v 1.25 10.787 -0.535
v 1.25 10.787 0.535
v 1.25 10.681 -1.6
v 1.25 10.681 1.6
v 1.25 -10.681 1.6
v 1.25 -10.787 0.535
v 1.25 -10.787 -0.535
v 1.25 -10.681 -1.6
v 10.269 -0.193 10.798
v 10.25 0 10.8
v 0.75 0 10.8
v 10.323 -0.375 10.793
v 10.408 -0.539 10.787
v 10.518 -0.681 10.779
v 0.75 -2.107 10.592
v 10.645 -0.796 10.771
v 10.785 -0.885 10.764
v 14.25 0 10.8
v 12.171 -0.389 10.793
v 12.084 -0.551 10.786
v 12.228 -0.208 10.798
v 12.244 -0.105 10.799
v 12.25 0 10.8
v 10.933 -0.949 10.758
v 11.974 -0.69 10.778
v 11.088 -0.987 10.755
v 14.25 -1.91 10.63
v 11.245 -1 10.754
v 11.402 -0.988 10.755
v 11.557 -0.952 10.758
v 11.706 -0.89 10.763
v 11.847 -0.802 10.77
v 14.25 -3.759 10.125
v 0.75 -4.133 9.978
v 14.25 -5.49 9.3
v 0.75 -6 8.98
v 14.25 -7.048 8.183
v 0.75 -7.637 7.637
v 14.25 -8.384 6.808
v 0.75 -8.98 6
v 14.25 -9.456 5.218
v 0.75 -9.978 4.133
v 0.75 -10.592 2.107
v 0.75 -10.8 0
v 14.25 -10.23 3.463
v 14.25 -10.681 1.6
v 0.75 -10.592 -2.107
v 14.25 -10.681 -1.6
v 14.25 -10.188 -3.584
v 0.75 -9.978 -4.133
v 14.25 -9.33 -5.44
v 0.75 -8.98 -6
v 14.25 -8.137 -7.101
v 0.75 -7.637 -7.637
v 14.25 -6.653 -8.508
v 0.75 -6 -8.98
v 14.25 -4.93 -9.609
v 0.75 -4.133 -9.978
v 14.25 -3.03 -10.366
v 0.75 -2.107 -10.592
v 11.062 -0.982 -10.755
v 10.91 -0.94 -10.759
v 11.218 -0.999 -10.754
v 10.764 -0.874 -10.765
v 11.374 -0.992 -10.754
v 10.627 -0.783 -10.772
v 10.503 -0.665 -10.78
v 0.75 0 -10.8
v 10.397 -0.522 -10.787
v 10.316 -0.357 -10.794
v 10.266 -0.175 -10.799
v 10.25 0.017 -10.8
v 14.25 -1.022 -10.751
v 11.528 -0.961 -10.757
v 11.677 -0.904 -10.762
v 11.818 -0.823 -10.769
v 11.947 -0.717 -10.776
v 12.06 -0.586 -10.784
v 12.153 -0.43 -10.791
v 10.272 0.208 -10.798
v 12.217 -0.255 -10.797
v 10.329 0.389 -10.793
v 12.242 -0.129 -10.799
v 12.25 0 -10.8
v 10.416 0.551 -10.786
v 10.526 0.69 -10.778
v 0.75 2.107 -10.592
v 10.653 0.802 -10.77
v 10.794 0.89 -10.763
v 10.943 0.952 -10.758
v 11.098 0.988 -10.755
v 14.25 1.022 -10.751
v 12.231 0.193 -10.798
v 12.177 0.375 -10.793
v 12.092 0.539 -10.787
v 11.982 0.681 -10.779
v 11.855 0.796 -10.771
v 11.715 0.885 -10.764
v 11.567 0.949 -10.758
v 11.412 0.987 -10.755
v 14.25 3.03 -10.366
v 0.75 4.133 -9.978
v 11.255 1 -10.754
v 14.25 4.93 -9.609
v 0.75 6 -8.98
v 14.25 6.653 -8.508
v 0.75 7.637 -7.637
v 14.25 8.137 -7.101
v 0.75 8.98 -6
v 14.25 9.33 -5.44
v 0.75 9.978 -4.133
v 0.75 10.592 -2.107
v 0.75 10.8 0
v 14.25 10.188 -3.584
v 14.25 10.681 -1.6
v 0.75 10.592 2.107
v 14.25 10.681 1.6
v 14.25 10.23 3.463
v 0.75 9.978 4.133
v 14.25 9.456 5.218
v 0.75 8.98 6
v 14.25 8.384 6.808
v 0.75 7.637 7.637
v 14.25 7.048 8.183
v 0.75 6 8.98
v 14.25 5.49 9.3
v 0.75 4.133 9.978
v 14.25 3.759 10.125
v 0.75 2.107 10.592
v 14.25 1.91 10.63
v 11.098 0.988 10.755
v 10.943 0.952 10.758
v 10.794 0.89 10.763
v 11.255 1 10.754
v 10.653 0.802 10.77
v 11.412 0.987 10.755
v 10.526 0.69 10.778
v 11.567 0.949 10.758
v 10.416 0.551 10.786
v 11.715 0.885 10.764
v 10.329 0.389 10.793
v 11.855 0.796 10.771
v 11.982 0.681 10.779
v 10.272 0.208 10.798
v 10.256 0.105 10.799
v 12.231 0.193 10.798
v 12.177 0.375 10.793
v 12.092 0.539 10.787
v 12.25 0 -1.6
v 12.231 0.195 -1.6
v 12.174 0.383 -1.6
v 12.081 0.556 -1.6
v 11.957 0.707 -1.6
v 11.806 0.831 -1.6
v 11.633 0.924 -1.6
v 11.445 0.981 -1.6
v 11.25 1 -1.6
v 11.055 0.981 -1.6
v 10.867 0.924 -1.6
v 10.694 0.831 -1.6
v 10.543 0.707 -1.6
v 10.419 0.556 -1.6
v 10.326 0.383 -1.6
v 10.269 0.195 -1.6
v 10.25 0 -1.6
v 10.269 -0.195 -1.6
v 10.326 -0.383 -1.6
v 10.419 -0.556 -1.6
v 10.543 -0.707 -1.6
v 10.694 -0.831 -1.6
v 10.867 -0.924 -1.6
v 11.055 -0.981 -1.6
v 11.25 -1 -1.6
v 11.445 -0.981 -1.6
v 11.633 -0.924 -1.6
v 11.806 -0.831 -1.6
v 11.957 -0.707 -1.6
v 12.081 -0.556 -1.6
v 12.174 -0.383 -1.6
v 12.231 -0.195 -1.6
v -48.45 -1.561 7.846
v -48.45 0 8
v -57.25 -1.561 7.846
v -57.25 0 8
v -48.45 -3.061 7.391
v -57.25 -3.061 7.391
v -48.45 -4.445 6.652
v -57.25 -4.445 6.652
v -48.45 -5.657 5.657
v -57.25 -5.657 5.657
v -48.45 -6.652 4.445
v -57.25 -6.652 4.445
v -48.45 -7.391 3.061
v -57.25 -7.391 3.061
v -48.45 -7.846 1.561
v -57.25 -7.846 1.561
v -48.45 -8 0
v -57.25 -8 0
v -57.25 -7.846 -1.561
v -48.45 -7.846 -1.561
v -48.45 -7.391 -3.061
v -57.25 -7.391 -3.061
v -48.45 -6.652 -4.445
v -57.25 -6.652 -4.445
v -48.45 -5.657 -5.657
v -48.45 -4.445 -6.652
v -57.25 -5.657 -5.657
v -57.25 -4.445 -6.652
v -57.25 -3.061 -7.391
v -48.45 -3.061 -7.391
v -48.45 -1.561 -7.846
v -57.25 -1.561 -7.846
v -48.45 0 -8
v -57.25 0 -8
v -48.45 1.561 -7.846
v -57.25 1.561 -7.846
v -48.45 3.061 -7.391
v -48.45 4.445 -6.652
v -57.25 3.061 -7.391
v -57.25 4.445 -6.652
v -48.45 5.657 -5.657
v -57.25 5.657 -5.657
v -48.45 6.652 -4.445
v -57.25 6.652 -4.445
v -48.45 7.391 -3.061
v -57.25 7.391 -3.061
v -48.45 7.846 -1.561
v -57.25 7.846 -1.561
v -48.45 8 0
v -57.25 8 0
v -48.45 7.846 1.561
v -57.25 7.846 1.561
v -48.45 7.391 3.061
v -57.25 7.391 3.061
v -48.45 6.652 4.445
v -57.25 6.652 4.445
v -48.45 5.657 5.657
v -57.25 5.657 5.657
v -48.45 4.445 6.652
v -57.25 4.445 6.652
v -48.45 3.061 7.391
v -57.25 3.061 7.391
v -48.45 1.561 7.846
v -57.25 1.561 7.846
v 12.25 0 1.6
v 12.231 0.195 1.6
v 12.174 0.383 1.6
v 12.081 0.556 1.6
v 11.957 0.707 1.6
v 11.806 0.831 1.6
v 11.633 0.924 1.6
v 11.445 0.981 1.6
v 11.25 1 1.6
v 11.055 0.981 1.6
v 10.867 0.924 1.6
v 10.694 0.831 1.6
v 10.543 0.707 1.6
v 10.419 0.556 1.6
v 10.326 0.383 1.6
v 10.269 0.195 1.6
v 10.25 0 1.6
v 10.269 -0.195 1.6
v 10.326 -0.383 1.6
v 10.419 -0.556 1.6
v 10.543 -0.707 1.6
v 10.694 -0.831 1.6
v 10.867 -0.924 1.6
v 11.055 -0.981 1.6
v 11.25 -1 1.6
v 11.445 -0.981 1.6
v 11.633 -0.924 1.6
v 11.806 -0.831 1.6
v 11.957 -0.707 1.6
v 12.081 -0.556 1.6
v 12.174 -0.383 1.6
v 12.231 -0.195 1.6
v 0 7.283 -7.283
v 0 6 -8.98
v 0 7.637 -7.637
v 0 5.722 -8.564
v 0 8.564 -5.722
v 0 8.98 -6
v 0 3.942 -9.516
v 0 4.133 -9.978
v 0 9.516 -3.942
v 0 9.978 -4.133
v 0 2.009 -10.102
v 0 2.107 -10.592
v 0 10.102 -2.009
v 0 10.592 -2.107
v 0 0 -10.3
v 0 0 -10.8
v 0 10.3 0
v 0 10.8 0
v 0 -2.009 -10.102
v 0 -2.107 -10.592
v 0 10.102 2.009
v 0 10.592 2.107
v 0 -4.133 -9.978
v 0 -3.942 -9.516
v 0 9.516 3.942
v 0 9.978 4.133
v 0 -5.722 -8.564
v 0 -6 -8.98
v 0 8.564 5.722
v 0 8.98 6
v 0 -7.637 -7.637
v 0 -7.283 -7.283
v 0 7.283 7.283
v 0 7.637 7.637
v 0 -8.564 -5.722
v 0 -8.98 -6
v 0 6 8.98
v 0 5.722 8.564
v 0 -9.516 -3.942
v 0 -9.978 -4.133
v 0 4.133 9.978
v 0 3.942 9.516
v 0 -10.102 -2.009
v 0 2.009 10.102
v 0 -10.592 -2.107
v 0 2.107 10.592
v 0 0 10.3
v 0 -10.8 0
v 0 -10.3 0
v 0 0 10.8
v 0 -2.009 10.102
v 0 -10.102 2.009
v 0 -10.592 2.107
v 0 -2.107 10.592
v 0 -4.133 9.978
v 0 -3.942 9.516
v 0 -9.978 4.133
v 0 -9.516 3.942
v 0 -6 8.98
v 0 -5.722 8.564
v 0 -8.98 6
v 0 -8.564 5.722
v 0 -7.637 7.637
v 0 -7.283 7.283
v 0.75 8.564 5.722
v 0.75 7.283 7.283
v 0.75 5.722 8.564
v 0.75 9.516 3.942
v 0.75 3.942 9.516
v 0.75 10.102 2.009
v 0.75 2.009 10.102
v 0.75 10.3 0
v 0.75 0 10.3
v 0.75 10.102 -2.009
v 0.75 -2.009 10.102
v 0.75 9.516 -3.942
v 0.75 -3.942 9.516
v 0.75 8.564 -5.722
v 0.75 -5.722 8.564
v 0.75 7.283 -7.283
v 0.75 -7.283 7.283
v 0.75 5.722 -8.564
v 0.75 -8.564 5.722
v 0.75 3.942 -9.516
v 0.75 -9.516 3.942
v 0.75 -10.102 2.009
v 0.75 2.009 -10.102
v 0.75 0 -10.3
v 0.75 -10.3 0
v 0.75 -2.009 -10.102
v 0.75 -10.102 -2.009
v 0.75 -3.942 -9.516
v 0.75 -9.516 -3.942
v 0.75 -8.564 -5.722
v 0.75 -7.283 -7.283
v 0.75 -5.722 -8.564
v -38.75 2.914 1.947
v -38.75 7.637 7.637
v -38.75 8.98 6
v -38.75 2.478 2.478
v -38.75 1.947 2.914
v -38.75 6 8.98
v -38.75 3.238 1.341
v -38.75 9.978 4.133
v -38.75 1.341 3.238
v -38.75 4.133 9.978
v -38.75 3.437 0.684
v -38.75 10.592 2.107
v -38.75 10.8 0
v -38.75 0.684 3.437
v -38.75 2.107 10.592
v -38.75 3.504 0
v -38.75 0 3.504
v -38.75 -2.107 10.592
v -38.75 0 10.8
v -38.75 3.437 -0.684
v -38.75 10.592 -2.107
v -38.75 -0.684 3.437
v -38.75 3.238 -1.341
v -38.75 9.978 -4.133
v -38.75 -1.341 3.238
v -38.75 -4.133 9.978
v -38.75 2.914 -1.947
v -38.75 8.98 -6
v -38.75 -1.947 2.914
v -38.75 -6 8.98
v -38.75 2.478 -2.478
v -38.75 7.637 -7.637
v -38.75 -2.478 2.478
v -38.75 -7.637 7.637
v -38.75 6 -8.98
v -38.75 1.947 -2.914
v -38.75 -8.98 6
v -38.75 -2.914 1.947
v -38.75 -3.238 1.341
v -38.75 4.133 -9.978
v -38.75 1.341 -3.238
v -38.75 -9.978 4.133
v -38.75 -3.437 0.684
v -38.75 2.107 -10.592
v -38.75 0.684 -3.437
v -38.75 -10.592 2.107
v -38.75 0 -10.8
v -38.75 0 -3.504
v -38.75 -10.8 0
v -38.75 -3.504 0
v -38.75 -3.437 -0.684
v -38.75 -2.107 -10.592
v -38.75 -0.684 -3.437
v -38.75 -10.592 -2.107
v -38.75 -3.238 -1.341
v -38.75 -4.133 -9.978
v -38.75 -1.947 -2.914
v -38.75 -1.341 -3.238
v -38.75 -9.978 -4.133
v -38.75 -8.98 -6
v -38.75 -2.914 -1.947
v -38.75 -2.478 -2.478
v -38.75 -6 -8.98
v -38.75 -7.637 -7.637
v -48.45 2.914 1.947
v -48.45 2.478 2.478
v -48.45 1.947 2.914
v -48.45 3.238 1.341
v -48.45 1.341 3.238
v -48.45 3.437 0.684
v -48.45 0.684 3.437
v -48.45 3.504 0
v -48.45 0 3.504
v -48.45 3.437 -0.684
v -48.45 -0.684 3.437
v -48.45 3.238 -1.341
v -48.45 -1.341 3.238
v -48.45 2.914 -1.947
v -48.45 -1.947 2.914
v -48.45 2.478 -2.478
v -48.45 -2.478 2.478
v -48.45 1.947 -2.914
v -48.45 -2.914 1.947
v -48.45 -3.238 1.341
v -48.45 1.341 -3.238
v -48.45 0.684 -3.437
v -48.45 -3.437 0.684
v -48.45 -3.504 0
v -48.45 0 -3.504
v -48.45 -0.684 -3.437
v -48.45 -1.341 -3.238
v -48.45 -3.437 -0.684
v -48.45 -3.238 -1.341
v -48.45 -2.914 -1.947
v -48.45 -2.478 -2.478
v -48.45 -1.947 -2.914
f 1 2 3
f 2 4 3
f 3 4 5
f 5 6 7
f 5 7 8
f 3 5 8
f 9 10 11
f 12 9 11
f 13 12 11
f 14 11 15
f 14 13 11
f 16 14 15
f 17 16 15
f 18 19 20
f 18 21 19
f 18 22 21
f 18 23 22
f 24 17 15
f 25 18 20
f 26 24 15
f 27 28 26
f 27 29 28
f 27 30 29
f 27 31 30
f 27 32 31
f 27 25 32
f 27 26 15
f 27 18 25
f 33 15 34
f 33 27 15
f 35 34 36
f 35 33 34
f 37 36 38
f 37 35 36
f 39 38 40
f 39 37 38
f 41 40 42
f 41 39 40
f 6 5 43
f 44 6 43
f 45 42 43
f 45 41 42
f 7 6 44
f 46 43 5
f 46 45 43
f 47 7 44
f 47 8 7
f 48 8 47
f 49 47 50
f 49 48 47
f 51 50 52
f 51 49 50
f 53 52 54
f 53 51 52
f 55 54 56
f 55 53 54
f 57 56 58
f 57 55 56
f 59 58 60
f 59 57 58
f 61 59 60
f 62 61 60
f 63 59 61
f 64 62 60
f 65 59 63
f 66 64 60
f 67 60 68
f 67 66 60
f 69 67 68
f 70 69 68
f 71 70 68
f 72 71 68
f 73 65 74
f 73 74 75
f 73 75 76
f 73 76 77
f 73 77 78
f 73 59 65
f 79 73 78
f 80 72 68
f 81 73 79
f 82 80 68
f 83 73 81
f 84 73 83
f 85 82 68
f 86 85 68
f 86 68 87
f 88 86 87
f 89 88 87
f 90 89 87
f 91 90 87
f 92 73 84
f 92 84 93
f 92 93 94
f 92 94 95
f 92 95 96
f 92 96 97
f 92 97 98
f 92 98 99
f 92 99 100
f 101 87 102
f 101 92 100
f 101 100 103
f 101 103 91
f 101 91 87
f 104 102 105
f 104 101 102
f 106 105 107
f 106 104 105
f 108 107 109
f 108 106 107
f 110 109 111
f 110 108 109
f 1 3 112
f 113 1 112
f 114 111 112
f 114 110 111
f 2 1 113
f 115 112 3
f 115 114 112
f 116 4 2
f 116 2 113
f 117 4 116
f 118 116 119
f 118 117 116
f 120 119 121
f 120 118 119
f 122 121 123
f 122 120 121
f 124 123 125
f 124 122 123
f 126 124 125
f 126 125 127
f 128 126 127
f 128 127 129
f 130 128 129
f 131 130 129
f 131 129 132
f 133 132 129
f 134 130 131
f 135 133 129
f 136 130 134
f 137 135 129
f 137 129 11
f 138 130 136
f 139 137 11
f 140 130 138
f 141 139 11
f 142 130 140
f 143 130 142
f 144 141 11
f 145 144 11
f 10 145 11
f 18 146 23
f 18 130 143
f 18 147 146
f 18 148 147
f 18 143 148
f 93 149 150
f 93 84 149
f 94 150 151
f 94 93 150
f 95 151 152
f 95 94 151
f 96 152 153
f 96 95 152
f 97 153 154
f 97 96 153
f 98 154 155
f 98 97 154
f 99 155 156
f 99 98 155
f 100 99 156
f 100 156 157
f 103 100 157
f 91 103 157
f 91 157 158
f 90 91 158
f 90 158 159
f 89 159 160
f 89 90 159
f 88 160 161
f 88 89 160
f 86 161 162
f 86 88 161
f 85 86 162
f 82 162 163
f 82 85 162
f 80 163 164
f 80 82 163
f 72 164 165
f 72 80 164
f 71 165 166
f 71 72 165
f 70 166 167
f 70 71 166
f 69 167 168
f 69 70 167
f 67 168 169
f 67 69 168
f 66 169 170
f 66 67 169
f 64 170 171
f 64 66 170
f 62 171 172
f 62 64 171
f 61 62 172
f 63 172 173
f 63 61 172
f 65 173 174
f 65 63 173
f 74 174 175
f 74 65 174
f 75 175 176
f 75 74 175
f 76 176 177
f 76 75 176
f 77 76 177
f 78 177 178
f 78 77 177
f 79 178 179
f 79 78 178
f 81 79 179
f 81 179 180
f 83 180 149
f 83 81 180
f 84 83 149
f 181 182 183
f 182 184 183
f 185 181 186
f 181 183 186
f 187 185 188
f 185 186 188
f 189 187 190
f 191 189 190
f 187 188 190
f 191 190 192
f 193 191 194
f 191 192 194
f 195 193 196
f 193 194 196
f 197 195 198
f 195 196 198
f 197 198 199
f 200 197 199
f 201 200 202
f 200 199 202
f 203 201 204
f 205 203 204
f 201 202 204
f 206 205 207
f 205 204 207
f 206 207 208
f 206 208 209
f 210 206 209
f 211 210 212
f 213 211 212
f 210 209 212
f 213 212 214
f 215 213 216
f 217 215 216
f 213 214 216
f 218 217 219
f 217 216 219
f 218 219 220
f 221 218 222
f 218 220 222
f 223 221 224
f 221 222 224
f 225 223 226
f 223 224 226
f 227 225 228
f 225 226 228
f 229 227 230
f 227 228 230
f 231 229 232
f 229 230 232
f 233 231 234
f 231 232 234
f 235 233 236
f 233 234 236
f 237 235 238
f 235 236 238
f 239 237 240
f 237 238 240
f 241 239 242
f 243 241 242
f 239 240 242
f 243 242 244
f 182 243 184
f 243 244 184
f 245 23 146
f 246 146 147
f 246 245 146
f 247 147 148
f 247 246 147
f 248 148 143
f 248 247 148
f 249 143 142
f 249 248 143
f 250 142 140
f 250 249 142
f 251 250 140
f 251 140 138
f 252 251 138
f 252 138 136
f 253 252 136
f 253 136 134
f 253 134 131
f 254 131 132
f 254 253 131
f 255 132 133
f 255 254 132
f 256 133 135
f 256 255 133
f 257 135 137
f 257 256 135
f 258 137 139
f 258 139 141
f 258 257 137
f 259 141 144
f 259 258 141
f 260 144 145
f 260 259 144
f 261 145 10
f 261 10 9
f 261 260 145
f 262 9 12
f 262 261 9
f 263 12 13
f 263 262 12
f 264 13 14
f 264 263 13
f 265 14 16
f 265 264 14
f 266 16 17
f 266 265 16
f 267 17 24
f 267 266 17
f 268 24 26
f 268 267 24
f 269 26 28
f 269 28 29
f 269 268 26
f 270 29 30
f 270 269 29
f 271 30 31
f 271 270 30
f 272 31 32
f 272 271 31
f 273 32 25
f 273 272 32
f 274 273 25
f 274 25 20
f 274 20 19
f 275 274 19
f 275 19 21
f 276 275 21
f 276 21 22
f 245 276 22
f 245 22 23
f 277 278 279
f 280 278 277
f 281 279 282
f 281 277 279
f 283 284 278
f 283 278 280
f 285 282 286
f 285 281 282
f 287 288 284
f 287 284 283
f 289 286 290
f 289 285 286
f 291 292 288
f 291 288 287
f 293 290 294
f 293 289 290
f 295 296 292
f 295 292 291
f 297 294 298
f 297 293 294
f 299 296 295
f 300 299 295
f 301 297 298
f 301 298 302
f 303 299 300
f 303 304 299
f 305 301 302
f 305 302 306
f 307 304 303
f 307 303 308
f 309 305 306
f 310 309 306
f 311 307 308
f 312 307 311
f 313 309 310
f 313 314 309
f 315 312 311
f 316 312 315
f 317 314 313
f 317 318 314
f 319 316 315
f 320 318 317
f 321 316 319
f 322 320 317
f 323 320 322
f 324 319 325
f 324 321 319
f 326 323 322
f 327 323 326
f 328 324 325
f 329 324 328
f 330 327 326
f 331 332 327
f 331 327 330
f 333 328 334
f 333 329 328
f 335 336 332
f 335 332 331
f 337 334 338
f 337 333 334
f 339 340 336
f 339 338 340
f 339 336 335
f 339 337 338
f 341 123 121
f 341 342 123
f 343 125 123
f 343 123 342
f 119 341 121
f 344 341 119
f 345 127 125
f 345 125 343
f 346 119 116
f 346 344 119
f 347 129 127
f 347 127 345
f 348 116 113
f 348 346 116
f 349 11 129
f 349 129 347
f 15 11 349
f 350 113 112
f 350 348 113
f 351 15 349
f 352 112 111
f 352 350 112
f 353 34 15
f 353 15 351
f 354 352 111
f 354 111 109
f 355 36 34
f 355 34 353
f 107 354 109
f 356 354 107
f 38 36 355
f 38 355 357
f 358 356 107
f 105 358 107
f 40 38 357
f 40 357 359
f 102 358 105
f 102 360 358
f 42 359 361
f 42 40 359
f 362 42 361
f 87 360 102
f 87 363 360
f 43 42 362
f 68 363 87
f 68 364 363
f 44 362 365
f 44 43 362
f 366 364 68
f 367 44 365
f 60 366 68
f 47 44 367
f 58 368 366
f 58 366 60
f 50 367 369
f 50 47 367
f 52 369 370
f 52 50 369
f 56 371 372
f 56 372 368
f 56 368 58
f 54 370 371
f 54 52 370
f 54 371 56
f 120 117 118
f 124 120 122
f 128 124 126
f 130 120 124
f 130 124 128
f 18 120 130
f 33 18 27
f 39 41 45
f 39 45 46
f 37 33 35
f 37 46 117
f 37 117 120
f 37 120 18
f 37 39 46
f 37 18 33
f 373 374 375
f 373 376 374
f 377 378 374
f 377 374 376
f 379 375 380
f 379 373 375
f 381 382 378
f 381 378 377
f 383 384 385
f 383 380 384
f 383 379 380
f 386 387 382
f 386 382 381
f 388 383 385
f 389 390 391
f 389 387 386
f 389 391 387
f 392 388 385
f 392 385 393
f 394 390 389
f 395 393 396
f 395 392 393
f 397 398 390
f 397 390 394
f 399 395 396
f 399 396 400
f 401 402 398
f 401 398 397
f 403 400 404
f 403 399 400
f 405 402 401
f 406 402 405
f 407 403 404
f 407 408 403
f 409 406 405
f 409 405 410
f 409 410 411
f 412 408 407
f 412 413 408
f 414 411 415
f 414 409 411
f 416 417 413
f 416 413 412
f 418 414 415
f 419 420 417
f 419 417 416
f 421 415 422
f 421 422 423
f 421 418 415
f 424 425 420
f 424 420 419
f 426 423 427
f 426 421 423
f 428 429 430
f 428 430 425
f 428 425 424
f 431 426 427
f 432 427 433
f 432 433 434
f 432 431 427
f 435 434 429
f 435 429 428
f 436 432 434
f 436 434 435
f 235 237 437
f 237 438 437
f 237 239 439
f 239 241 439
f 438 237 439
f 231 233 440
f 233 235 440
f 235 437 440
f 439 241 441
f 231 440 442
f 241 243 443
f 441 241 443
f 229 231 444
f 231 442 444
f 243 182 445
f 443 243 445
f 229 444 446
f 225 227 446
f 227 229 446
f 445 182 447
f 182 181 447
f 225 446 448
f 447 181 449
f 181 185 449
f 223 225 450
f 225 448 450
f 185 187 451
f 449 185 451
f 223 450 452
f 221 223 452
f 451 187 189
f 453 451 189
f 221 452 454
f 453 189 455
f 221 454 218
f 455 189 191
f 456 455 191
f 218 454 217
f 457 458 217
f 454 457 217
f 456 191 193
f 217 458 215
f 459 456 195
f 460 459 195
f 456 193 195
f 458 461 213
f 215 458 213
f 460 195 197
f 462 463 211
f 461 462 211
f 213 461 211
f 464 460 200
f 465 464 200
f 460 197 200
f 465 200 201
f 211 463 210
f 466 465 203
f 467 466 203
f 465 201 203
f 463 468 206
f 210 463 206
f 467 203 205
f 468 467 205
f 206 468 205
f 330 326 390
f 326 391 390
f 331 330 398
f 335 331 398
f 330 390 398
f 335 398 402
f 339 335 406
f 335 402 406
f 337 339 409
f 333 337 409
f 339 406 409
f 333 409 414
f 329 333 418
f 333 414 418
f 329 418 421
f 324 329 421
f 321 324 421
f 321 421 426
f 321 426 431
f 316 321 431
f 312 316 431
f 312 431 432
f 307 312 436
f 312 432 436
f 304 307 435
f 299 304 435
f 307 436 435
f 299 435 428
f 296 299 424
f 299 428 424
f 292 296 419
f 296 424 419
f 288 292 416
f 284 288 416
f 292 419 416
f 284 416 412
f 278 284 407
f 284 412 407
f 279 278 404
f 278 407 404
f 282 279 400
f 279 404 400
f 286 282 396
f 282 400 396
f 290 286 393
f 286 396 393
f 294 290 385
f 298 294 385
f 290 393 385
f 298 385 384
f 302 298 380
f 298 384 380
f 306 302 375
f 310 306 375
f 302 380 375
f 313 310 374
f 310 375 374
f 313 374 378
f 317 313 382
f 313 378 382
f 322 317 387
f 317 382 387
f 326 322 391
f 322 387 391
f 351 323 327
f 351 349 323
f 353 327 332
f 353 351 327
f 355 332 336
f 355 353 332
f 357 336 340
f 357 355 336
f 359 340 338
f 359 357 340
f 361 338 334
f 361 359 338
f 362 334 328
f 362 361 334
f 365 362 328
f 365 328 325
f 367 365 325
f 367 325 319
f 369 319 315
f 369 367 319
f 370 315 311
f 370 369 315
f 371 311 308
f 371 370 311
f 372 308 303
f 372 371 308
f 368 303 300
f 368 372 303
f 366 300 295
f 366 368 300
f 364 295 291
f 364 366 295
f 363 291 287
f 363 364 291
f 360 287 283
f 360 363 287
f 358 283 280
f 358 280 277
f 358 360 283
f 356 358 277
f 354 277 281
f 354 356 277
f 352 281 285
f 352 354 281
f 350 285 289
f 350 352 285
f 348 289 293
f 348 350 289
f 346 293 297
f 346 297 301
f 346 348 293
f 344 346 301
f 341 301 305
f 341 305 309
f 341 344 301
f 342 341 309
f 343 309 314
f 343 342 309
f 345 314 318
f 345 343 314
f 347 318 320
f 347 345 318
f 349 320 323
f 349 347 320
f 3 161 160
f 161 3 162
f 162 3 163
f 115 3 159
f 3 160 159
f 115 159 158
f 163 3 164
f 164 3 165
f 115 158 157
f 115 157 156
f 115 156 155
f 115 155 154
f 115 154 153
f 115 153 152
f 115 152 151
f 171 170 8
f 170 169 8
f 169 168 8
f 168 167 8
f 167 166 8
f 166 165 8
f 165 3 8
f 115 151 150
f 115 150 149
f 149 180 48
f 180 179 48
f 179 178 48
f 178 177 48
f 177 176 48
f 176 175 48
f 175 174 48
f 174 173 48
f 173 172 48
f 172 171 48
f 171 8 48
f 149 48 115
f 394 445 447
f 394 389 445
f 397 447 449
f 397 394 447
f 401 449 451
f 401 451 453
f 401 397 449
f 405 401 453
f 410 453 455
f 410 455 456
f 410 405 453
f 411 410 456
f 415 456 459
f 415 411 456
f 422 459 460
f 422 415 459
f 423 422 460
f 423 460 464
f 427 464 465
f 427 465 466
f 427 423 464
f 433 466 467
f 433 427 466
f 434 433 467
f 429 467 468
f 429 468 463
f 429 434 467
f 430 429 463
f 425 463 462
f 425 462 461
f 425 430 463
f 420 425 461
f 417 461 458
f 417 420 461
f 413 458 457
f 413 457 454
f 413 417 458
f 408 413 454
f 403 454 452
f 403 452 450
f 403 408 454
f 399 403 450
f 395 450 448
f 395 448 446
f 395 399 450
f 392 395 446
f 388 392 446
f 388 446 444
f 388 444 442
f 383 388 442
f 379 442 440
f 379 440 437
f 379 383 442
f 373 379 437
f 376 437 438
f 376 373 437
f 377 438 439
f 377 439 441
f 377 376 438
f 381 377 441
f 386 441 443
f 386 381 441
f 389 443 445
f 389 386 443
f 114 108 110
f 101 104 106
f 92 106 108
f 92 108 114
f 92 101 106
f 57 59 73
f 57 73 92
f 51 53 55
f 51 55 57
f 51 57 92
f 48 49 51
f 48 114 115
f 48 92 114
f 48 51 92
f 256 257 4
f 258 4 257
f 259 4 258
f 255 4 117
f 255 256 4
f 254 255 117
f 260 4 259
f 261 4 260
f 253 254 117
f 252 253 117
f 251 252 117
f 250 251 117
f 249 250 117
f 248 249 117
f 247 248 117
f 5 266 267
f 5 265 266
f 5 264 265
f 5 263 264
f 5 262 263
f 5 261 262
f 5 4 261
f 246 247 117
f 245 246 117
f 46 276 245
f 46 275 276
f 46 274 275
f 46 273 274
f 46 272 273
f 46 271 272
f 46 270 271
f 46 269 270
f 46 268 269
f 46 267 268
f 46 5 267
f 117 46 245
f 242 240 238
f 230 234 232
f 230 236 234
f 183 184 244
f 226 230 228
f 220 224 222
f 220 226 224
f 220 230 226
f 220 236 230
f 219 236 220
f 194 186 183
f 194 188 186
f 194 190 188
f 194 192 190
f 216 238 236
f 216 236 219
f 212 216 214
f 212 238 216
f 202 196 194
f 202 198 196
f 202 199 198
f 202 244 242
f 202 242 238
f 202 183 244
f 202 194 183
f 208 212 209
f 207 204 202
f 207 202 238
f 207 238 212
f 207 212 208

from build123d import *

# Parameters (mm, degrees)
CUT_EXTRUDE1_DEPTH      = 60.252362822
CUT_EXTRUDE1_DEPTH_BACK = 60.252362822
SKETCH2_R               = 1
CUT_EXTRUDE2_DEPTH      = 60.252362859
CUT_EXTRUDE2_DEPTH_BACK = 60.252362859
SKETCH3_W               = 26
SKETCH3_H               = 3.2


with BuildPart() as part:
    # Sketch1 → Revolve1 (revolve)
    with BuildSketch(Plane.XY, mode=Mode.PRIVATE) as revolve1_sk:
        Polygon((-57.25, 0), (-57.25, 8), (-57.042201581, 8), (-48.45, 8), (-48.45, 5.8595471), (-48.45, 3.504470165), (-38.75, 3.504470165), (-38.75, 10.8), (-33.89, 10.8), (0, 10.8), (0, 10.3), (0.75, 10.3), (0.75, 10.8), (14.25, 10.8), (14.25, 0), align=None)
    revolve(revolve1_sk.sketch.rotate(Axis((-38.390119341, 0, 0), (1, 0, 0)), 90), axis=Axis((-38.390119341, 0, 0), (1, 0, 0)))

    # Sketch2 → Cut-Extrude1 (cut, two sides: drawn at the far end of the back side and taken through both)
    with BuildSketch(Plane.XY.offset(-CUT_EXTRUDE1_DEPTH_BACK)):
        with Locations((11.25, 0)):
            Circle(SKETCH2_R)
    extrude(amount=CUT_EXTRUDE1_DEPTH + CUT_EXTRUDE1_DEPTH_BACK, mode=Mode.SUBTRACT)

    # Sketch3 → Cut-Extrude2 (cut, two sides: drawn at the far end of the back side and taken through both)
    with BuildSketch(Plane(origin=(0, 0, 0), x_dir=(1, 0, 0), z_dir=(0, 1, 0)).offset(-CUT_EXTRUDE2_DEPTH_BACK)):
        with Locations((14.25, 0)):
            Rectangle(SKETCH3_W, SKETCH3_H)
    extrude(amount=CUT_EXTRUDE2_DEPTH + CUT_EXTRUDE2_DEPTH_BACK, mode=Mode.SUBTRACT)


solid = part.part
